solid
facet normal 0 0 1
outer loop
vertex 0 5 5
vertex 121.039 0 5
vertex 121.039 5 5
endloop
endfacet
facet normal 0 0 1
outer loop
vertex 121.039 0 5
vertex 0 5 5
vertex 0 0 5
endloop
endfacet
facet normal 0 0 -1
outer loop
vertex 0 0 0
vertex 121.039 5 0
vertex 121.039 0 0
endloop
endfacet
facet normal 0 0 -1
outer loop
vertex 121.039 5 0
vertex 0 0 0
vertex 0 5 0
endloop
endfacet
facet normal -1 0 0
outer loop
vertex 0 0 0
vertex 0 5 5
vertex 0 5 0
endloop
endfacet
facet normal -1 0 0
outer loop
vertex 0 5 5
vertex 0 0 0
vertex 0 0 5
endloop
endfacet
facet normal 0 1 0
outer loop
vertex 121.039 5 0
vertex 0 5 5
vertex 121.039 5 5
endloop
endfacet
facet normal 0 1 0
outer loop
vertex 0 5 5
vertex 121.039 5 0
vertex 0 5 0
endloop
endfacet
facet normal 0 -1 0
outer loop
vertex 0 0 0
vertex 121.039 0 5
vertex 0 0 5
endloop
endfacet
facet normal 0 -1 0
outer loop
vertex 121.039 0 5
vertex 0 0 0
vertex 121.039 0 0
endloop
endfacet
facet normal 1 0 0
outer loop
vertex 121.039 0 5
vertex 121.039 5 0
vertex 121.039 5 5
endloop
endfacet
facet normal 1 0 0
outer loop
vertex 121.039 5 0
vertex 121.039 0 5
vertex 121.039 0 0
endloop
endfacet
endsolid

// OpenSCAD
names = ["red","orange","yellow","lime","green","teal","cyan","blue"];
for (i = [0:39]) color(names[i % 8]) translate([i * 3, 0, 0]) cube([4 + i*0.001, 5, 5]);
